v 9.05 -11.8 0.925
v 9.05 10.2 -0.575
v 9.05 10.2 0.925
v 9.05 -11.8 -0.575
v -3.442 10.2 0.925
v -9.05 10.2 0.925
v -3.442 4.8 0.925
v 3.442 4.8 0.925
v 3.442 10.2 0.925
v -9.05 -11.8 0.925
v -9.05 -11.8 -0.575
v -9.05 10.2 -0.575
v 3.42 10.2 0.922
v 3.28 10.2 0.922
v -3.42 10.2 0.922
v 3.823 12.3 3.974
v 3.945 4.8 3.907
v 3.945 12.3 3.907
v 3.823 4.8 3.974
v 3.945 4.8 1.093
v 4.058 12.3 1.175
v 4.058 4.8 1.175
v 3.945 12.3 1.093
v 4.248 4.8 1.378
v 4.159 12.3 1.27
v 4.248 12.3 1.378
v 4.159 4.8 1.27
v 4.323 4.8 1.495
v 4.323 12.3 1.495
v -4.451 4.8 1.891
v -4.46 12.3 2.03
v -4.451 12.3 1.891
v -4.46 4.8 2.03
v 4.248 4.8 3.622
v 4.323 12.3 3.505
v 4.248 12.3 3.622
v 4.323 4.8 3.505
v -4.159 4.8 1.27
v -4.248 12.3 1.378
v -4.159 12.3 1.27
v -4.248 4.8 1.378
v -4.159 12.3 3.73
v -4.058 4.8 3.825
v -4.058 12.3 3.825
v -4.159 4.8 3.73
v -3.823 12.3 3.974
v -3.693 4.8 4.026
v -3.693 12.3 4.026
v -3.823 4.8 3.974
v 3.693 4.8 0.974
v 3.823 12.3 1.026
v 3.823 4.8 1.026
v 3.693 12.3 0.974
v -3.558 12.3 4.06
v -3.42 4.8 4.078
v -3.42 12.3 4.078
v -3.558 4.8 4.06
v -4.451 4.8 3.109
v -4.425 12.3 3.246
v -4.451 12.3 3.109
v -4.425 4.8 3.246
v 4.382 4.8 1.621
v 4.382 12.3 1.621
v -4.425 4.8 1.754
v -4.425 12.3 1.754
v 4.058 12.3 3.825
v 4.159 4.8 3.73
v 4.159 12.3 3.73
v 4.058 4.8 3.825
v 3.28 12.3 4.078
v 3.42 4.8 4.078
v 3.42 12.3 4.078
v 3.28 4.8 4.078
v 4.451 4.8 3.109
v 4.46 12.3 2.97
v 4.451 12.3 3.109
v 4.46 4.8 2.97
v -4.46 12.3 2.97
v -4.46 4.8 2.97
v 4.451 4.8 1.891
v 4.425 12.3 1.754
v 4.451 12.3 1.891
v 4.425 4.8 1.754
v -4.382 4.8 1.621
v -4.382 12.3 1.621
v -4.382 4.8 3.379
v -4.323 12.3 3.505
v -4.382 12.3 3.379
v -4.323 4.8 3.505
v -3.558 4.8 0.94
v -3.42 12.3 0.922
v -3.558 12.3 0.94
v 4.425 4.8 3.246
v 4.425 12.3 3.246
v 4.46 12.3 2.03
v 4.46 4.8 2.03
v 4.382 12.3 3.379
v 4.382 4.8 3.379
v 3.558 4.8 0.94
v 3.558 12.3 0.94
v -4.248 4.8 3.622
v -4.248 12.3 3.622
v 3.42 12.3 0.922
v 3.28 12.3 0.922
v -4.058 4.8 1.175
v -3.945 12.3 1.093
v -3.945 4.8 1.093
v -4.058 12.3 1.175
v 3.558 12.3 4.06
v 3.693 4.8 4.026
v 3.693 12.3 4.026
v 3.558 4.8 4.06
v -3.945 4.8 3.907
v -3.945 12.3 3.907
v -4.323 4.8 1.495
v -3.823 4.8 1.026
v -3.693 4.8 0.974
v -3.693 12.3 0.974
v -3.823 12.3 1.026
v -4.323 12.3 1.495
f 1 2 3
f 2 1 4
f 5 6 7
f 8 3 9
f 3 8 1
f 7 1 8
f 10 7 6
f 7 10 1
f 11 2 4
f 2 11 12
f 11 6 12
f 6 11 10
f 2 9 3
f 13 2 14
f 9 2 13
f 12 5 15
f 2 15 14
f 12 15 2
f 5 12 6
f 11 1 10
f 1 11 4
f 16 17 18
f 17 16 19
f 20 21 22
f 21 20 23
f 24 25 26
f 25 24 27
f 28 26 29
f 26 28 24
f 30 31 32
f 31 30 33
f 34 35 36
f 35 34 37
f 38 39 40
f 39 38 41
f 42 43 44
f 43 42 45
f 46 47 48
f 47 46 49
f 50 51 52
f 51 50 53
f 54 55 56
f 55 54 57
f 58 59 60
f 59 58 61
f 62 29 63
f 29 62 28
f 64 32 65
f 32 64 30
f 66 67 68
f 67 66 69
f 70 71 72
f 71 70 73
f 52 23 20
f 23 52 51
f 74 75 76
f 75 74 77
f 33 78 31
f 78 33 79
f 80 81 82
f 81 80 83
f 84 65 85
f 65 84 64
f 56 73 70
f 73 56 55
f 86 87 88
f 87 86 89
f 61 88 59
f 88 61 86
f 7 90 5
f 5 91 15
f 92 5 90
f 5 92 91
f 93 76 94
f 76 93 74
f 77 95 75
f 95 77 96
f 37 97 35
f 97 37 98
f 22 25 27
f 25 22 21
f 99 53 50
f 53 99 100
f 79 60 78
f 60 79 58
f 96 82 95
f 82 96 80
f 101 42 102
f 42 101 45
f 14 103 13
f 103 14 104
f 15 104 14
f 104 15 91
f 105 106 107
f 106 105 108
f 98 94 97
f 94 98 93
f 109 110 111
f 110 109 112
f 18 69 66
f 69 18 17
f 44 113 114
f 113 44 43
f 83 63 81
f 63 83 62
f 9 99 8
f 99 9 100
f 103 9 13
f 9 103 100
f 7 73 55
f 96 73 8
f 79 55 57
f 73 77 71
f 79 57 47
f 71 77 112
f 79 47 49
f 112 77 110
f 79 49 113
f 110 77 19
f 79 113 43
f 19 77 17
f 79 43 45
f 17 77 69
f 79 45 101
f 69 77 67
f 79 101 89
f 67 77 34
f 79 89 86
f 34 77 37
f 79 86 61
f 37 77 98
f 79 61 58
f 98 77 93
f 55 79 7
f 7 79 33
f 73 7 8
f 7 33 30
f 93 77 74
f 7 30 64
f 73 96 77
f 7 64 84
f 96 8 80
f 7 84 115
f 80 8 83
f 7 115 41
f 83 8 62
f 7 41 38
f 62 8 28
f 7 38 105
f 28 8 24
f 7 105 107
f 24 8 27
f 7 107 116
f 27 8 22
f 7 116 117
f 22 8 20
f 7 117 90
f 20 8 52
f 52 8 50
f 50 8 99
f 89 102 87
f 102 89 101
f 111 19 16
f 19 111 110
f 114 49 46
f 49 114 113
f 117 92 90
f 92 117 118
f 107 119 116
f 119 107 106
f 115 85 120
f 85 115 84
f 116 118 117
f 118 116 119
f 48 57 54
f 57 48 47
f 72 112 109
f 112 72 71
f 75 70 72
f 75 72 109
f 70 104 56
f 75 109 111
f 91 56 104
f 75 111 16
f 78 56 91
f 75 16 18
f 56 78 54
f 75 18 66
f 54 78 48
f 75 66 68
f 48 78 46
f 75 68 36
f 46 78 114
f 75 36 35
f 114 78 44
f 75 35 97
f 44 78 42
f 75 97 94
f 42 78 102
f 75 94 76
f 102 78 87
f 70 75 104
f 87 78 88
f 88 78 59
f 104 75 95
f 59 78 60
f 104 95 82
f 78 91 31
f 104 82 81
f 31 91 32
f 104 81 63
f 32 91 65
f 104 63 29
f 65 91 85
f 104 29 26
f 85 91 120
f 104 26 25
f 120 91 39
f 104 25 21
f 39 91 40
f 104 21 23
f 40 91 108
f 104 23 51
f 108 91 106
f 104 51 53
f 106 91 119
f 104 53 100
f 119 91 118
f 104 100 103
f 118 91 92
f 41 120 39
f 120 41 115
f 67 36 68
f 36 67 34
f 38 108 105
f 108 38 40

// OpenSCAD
$fn=50;


module maybe_spacing(spacing){
    if(spacing){
        minkowski() {
            children();
            sphere(d=0.25);
        }
    }
    else {
        children();
    }
}






module usb_c_port(){
    linear_extrude(7.5){
        hull() {
            translate([3.35,0.47,0])
            circle(r=1.11);
            
            translate([3.35,-0.47,0])
            circle(r=1.11);
            
            mirror([1,0,0]){
                translate([3.35,0.47,0])
                circle(r=1.11);
                
                translate([3.35,-0.47,0])
                circle(r=1.11);    
            }
        }
    }
}


module usb_c_breakout(spacing=false){
    maybe_spacing(spacing){
        translate([0,-0.8,0.175])
        cube([18.1,22,1.5], center=true);
        
        translate([0,12.3,2.5])
        rotate([90,0,0])
        usb_c_port();
    }
}


module promicro(spacing=false){
    maybe_spacing(spacing){
        translate([0,-0.8,0.175])
        cube([18.1,36.1,1.5], center=true);
        
        translate([0,18.9,2.5])
        rotate([90,0,0])
        usb_c_port();
    }
}




//translate([0,0,-1.75])
//promicro(spacing=false);

usb_c_breakout();
